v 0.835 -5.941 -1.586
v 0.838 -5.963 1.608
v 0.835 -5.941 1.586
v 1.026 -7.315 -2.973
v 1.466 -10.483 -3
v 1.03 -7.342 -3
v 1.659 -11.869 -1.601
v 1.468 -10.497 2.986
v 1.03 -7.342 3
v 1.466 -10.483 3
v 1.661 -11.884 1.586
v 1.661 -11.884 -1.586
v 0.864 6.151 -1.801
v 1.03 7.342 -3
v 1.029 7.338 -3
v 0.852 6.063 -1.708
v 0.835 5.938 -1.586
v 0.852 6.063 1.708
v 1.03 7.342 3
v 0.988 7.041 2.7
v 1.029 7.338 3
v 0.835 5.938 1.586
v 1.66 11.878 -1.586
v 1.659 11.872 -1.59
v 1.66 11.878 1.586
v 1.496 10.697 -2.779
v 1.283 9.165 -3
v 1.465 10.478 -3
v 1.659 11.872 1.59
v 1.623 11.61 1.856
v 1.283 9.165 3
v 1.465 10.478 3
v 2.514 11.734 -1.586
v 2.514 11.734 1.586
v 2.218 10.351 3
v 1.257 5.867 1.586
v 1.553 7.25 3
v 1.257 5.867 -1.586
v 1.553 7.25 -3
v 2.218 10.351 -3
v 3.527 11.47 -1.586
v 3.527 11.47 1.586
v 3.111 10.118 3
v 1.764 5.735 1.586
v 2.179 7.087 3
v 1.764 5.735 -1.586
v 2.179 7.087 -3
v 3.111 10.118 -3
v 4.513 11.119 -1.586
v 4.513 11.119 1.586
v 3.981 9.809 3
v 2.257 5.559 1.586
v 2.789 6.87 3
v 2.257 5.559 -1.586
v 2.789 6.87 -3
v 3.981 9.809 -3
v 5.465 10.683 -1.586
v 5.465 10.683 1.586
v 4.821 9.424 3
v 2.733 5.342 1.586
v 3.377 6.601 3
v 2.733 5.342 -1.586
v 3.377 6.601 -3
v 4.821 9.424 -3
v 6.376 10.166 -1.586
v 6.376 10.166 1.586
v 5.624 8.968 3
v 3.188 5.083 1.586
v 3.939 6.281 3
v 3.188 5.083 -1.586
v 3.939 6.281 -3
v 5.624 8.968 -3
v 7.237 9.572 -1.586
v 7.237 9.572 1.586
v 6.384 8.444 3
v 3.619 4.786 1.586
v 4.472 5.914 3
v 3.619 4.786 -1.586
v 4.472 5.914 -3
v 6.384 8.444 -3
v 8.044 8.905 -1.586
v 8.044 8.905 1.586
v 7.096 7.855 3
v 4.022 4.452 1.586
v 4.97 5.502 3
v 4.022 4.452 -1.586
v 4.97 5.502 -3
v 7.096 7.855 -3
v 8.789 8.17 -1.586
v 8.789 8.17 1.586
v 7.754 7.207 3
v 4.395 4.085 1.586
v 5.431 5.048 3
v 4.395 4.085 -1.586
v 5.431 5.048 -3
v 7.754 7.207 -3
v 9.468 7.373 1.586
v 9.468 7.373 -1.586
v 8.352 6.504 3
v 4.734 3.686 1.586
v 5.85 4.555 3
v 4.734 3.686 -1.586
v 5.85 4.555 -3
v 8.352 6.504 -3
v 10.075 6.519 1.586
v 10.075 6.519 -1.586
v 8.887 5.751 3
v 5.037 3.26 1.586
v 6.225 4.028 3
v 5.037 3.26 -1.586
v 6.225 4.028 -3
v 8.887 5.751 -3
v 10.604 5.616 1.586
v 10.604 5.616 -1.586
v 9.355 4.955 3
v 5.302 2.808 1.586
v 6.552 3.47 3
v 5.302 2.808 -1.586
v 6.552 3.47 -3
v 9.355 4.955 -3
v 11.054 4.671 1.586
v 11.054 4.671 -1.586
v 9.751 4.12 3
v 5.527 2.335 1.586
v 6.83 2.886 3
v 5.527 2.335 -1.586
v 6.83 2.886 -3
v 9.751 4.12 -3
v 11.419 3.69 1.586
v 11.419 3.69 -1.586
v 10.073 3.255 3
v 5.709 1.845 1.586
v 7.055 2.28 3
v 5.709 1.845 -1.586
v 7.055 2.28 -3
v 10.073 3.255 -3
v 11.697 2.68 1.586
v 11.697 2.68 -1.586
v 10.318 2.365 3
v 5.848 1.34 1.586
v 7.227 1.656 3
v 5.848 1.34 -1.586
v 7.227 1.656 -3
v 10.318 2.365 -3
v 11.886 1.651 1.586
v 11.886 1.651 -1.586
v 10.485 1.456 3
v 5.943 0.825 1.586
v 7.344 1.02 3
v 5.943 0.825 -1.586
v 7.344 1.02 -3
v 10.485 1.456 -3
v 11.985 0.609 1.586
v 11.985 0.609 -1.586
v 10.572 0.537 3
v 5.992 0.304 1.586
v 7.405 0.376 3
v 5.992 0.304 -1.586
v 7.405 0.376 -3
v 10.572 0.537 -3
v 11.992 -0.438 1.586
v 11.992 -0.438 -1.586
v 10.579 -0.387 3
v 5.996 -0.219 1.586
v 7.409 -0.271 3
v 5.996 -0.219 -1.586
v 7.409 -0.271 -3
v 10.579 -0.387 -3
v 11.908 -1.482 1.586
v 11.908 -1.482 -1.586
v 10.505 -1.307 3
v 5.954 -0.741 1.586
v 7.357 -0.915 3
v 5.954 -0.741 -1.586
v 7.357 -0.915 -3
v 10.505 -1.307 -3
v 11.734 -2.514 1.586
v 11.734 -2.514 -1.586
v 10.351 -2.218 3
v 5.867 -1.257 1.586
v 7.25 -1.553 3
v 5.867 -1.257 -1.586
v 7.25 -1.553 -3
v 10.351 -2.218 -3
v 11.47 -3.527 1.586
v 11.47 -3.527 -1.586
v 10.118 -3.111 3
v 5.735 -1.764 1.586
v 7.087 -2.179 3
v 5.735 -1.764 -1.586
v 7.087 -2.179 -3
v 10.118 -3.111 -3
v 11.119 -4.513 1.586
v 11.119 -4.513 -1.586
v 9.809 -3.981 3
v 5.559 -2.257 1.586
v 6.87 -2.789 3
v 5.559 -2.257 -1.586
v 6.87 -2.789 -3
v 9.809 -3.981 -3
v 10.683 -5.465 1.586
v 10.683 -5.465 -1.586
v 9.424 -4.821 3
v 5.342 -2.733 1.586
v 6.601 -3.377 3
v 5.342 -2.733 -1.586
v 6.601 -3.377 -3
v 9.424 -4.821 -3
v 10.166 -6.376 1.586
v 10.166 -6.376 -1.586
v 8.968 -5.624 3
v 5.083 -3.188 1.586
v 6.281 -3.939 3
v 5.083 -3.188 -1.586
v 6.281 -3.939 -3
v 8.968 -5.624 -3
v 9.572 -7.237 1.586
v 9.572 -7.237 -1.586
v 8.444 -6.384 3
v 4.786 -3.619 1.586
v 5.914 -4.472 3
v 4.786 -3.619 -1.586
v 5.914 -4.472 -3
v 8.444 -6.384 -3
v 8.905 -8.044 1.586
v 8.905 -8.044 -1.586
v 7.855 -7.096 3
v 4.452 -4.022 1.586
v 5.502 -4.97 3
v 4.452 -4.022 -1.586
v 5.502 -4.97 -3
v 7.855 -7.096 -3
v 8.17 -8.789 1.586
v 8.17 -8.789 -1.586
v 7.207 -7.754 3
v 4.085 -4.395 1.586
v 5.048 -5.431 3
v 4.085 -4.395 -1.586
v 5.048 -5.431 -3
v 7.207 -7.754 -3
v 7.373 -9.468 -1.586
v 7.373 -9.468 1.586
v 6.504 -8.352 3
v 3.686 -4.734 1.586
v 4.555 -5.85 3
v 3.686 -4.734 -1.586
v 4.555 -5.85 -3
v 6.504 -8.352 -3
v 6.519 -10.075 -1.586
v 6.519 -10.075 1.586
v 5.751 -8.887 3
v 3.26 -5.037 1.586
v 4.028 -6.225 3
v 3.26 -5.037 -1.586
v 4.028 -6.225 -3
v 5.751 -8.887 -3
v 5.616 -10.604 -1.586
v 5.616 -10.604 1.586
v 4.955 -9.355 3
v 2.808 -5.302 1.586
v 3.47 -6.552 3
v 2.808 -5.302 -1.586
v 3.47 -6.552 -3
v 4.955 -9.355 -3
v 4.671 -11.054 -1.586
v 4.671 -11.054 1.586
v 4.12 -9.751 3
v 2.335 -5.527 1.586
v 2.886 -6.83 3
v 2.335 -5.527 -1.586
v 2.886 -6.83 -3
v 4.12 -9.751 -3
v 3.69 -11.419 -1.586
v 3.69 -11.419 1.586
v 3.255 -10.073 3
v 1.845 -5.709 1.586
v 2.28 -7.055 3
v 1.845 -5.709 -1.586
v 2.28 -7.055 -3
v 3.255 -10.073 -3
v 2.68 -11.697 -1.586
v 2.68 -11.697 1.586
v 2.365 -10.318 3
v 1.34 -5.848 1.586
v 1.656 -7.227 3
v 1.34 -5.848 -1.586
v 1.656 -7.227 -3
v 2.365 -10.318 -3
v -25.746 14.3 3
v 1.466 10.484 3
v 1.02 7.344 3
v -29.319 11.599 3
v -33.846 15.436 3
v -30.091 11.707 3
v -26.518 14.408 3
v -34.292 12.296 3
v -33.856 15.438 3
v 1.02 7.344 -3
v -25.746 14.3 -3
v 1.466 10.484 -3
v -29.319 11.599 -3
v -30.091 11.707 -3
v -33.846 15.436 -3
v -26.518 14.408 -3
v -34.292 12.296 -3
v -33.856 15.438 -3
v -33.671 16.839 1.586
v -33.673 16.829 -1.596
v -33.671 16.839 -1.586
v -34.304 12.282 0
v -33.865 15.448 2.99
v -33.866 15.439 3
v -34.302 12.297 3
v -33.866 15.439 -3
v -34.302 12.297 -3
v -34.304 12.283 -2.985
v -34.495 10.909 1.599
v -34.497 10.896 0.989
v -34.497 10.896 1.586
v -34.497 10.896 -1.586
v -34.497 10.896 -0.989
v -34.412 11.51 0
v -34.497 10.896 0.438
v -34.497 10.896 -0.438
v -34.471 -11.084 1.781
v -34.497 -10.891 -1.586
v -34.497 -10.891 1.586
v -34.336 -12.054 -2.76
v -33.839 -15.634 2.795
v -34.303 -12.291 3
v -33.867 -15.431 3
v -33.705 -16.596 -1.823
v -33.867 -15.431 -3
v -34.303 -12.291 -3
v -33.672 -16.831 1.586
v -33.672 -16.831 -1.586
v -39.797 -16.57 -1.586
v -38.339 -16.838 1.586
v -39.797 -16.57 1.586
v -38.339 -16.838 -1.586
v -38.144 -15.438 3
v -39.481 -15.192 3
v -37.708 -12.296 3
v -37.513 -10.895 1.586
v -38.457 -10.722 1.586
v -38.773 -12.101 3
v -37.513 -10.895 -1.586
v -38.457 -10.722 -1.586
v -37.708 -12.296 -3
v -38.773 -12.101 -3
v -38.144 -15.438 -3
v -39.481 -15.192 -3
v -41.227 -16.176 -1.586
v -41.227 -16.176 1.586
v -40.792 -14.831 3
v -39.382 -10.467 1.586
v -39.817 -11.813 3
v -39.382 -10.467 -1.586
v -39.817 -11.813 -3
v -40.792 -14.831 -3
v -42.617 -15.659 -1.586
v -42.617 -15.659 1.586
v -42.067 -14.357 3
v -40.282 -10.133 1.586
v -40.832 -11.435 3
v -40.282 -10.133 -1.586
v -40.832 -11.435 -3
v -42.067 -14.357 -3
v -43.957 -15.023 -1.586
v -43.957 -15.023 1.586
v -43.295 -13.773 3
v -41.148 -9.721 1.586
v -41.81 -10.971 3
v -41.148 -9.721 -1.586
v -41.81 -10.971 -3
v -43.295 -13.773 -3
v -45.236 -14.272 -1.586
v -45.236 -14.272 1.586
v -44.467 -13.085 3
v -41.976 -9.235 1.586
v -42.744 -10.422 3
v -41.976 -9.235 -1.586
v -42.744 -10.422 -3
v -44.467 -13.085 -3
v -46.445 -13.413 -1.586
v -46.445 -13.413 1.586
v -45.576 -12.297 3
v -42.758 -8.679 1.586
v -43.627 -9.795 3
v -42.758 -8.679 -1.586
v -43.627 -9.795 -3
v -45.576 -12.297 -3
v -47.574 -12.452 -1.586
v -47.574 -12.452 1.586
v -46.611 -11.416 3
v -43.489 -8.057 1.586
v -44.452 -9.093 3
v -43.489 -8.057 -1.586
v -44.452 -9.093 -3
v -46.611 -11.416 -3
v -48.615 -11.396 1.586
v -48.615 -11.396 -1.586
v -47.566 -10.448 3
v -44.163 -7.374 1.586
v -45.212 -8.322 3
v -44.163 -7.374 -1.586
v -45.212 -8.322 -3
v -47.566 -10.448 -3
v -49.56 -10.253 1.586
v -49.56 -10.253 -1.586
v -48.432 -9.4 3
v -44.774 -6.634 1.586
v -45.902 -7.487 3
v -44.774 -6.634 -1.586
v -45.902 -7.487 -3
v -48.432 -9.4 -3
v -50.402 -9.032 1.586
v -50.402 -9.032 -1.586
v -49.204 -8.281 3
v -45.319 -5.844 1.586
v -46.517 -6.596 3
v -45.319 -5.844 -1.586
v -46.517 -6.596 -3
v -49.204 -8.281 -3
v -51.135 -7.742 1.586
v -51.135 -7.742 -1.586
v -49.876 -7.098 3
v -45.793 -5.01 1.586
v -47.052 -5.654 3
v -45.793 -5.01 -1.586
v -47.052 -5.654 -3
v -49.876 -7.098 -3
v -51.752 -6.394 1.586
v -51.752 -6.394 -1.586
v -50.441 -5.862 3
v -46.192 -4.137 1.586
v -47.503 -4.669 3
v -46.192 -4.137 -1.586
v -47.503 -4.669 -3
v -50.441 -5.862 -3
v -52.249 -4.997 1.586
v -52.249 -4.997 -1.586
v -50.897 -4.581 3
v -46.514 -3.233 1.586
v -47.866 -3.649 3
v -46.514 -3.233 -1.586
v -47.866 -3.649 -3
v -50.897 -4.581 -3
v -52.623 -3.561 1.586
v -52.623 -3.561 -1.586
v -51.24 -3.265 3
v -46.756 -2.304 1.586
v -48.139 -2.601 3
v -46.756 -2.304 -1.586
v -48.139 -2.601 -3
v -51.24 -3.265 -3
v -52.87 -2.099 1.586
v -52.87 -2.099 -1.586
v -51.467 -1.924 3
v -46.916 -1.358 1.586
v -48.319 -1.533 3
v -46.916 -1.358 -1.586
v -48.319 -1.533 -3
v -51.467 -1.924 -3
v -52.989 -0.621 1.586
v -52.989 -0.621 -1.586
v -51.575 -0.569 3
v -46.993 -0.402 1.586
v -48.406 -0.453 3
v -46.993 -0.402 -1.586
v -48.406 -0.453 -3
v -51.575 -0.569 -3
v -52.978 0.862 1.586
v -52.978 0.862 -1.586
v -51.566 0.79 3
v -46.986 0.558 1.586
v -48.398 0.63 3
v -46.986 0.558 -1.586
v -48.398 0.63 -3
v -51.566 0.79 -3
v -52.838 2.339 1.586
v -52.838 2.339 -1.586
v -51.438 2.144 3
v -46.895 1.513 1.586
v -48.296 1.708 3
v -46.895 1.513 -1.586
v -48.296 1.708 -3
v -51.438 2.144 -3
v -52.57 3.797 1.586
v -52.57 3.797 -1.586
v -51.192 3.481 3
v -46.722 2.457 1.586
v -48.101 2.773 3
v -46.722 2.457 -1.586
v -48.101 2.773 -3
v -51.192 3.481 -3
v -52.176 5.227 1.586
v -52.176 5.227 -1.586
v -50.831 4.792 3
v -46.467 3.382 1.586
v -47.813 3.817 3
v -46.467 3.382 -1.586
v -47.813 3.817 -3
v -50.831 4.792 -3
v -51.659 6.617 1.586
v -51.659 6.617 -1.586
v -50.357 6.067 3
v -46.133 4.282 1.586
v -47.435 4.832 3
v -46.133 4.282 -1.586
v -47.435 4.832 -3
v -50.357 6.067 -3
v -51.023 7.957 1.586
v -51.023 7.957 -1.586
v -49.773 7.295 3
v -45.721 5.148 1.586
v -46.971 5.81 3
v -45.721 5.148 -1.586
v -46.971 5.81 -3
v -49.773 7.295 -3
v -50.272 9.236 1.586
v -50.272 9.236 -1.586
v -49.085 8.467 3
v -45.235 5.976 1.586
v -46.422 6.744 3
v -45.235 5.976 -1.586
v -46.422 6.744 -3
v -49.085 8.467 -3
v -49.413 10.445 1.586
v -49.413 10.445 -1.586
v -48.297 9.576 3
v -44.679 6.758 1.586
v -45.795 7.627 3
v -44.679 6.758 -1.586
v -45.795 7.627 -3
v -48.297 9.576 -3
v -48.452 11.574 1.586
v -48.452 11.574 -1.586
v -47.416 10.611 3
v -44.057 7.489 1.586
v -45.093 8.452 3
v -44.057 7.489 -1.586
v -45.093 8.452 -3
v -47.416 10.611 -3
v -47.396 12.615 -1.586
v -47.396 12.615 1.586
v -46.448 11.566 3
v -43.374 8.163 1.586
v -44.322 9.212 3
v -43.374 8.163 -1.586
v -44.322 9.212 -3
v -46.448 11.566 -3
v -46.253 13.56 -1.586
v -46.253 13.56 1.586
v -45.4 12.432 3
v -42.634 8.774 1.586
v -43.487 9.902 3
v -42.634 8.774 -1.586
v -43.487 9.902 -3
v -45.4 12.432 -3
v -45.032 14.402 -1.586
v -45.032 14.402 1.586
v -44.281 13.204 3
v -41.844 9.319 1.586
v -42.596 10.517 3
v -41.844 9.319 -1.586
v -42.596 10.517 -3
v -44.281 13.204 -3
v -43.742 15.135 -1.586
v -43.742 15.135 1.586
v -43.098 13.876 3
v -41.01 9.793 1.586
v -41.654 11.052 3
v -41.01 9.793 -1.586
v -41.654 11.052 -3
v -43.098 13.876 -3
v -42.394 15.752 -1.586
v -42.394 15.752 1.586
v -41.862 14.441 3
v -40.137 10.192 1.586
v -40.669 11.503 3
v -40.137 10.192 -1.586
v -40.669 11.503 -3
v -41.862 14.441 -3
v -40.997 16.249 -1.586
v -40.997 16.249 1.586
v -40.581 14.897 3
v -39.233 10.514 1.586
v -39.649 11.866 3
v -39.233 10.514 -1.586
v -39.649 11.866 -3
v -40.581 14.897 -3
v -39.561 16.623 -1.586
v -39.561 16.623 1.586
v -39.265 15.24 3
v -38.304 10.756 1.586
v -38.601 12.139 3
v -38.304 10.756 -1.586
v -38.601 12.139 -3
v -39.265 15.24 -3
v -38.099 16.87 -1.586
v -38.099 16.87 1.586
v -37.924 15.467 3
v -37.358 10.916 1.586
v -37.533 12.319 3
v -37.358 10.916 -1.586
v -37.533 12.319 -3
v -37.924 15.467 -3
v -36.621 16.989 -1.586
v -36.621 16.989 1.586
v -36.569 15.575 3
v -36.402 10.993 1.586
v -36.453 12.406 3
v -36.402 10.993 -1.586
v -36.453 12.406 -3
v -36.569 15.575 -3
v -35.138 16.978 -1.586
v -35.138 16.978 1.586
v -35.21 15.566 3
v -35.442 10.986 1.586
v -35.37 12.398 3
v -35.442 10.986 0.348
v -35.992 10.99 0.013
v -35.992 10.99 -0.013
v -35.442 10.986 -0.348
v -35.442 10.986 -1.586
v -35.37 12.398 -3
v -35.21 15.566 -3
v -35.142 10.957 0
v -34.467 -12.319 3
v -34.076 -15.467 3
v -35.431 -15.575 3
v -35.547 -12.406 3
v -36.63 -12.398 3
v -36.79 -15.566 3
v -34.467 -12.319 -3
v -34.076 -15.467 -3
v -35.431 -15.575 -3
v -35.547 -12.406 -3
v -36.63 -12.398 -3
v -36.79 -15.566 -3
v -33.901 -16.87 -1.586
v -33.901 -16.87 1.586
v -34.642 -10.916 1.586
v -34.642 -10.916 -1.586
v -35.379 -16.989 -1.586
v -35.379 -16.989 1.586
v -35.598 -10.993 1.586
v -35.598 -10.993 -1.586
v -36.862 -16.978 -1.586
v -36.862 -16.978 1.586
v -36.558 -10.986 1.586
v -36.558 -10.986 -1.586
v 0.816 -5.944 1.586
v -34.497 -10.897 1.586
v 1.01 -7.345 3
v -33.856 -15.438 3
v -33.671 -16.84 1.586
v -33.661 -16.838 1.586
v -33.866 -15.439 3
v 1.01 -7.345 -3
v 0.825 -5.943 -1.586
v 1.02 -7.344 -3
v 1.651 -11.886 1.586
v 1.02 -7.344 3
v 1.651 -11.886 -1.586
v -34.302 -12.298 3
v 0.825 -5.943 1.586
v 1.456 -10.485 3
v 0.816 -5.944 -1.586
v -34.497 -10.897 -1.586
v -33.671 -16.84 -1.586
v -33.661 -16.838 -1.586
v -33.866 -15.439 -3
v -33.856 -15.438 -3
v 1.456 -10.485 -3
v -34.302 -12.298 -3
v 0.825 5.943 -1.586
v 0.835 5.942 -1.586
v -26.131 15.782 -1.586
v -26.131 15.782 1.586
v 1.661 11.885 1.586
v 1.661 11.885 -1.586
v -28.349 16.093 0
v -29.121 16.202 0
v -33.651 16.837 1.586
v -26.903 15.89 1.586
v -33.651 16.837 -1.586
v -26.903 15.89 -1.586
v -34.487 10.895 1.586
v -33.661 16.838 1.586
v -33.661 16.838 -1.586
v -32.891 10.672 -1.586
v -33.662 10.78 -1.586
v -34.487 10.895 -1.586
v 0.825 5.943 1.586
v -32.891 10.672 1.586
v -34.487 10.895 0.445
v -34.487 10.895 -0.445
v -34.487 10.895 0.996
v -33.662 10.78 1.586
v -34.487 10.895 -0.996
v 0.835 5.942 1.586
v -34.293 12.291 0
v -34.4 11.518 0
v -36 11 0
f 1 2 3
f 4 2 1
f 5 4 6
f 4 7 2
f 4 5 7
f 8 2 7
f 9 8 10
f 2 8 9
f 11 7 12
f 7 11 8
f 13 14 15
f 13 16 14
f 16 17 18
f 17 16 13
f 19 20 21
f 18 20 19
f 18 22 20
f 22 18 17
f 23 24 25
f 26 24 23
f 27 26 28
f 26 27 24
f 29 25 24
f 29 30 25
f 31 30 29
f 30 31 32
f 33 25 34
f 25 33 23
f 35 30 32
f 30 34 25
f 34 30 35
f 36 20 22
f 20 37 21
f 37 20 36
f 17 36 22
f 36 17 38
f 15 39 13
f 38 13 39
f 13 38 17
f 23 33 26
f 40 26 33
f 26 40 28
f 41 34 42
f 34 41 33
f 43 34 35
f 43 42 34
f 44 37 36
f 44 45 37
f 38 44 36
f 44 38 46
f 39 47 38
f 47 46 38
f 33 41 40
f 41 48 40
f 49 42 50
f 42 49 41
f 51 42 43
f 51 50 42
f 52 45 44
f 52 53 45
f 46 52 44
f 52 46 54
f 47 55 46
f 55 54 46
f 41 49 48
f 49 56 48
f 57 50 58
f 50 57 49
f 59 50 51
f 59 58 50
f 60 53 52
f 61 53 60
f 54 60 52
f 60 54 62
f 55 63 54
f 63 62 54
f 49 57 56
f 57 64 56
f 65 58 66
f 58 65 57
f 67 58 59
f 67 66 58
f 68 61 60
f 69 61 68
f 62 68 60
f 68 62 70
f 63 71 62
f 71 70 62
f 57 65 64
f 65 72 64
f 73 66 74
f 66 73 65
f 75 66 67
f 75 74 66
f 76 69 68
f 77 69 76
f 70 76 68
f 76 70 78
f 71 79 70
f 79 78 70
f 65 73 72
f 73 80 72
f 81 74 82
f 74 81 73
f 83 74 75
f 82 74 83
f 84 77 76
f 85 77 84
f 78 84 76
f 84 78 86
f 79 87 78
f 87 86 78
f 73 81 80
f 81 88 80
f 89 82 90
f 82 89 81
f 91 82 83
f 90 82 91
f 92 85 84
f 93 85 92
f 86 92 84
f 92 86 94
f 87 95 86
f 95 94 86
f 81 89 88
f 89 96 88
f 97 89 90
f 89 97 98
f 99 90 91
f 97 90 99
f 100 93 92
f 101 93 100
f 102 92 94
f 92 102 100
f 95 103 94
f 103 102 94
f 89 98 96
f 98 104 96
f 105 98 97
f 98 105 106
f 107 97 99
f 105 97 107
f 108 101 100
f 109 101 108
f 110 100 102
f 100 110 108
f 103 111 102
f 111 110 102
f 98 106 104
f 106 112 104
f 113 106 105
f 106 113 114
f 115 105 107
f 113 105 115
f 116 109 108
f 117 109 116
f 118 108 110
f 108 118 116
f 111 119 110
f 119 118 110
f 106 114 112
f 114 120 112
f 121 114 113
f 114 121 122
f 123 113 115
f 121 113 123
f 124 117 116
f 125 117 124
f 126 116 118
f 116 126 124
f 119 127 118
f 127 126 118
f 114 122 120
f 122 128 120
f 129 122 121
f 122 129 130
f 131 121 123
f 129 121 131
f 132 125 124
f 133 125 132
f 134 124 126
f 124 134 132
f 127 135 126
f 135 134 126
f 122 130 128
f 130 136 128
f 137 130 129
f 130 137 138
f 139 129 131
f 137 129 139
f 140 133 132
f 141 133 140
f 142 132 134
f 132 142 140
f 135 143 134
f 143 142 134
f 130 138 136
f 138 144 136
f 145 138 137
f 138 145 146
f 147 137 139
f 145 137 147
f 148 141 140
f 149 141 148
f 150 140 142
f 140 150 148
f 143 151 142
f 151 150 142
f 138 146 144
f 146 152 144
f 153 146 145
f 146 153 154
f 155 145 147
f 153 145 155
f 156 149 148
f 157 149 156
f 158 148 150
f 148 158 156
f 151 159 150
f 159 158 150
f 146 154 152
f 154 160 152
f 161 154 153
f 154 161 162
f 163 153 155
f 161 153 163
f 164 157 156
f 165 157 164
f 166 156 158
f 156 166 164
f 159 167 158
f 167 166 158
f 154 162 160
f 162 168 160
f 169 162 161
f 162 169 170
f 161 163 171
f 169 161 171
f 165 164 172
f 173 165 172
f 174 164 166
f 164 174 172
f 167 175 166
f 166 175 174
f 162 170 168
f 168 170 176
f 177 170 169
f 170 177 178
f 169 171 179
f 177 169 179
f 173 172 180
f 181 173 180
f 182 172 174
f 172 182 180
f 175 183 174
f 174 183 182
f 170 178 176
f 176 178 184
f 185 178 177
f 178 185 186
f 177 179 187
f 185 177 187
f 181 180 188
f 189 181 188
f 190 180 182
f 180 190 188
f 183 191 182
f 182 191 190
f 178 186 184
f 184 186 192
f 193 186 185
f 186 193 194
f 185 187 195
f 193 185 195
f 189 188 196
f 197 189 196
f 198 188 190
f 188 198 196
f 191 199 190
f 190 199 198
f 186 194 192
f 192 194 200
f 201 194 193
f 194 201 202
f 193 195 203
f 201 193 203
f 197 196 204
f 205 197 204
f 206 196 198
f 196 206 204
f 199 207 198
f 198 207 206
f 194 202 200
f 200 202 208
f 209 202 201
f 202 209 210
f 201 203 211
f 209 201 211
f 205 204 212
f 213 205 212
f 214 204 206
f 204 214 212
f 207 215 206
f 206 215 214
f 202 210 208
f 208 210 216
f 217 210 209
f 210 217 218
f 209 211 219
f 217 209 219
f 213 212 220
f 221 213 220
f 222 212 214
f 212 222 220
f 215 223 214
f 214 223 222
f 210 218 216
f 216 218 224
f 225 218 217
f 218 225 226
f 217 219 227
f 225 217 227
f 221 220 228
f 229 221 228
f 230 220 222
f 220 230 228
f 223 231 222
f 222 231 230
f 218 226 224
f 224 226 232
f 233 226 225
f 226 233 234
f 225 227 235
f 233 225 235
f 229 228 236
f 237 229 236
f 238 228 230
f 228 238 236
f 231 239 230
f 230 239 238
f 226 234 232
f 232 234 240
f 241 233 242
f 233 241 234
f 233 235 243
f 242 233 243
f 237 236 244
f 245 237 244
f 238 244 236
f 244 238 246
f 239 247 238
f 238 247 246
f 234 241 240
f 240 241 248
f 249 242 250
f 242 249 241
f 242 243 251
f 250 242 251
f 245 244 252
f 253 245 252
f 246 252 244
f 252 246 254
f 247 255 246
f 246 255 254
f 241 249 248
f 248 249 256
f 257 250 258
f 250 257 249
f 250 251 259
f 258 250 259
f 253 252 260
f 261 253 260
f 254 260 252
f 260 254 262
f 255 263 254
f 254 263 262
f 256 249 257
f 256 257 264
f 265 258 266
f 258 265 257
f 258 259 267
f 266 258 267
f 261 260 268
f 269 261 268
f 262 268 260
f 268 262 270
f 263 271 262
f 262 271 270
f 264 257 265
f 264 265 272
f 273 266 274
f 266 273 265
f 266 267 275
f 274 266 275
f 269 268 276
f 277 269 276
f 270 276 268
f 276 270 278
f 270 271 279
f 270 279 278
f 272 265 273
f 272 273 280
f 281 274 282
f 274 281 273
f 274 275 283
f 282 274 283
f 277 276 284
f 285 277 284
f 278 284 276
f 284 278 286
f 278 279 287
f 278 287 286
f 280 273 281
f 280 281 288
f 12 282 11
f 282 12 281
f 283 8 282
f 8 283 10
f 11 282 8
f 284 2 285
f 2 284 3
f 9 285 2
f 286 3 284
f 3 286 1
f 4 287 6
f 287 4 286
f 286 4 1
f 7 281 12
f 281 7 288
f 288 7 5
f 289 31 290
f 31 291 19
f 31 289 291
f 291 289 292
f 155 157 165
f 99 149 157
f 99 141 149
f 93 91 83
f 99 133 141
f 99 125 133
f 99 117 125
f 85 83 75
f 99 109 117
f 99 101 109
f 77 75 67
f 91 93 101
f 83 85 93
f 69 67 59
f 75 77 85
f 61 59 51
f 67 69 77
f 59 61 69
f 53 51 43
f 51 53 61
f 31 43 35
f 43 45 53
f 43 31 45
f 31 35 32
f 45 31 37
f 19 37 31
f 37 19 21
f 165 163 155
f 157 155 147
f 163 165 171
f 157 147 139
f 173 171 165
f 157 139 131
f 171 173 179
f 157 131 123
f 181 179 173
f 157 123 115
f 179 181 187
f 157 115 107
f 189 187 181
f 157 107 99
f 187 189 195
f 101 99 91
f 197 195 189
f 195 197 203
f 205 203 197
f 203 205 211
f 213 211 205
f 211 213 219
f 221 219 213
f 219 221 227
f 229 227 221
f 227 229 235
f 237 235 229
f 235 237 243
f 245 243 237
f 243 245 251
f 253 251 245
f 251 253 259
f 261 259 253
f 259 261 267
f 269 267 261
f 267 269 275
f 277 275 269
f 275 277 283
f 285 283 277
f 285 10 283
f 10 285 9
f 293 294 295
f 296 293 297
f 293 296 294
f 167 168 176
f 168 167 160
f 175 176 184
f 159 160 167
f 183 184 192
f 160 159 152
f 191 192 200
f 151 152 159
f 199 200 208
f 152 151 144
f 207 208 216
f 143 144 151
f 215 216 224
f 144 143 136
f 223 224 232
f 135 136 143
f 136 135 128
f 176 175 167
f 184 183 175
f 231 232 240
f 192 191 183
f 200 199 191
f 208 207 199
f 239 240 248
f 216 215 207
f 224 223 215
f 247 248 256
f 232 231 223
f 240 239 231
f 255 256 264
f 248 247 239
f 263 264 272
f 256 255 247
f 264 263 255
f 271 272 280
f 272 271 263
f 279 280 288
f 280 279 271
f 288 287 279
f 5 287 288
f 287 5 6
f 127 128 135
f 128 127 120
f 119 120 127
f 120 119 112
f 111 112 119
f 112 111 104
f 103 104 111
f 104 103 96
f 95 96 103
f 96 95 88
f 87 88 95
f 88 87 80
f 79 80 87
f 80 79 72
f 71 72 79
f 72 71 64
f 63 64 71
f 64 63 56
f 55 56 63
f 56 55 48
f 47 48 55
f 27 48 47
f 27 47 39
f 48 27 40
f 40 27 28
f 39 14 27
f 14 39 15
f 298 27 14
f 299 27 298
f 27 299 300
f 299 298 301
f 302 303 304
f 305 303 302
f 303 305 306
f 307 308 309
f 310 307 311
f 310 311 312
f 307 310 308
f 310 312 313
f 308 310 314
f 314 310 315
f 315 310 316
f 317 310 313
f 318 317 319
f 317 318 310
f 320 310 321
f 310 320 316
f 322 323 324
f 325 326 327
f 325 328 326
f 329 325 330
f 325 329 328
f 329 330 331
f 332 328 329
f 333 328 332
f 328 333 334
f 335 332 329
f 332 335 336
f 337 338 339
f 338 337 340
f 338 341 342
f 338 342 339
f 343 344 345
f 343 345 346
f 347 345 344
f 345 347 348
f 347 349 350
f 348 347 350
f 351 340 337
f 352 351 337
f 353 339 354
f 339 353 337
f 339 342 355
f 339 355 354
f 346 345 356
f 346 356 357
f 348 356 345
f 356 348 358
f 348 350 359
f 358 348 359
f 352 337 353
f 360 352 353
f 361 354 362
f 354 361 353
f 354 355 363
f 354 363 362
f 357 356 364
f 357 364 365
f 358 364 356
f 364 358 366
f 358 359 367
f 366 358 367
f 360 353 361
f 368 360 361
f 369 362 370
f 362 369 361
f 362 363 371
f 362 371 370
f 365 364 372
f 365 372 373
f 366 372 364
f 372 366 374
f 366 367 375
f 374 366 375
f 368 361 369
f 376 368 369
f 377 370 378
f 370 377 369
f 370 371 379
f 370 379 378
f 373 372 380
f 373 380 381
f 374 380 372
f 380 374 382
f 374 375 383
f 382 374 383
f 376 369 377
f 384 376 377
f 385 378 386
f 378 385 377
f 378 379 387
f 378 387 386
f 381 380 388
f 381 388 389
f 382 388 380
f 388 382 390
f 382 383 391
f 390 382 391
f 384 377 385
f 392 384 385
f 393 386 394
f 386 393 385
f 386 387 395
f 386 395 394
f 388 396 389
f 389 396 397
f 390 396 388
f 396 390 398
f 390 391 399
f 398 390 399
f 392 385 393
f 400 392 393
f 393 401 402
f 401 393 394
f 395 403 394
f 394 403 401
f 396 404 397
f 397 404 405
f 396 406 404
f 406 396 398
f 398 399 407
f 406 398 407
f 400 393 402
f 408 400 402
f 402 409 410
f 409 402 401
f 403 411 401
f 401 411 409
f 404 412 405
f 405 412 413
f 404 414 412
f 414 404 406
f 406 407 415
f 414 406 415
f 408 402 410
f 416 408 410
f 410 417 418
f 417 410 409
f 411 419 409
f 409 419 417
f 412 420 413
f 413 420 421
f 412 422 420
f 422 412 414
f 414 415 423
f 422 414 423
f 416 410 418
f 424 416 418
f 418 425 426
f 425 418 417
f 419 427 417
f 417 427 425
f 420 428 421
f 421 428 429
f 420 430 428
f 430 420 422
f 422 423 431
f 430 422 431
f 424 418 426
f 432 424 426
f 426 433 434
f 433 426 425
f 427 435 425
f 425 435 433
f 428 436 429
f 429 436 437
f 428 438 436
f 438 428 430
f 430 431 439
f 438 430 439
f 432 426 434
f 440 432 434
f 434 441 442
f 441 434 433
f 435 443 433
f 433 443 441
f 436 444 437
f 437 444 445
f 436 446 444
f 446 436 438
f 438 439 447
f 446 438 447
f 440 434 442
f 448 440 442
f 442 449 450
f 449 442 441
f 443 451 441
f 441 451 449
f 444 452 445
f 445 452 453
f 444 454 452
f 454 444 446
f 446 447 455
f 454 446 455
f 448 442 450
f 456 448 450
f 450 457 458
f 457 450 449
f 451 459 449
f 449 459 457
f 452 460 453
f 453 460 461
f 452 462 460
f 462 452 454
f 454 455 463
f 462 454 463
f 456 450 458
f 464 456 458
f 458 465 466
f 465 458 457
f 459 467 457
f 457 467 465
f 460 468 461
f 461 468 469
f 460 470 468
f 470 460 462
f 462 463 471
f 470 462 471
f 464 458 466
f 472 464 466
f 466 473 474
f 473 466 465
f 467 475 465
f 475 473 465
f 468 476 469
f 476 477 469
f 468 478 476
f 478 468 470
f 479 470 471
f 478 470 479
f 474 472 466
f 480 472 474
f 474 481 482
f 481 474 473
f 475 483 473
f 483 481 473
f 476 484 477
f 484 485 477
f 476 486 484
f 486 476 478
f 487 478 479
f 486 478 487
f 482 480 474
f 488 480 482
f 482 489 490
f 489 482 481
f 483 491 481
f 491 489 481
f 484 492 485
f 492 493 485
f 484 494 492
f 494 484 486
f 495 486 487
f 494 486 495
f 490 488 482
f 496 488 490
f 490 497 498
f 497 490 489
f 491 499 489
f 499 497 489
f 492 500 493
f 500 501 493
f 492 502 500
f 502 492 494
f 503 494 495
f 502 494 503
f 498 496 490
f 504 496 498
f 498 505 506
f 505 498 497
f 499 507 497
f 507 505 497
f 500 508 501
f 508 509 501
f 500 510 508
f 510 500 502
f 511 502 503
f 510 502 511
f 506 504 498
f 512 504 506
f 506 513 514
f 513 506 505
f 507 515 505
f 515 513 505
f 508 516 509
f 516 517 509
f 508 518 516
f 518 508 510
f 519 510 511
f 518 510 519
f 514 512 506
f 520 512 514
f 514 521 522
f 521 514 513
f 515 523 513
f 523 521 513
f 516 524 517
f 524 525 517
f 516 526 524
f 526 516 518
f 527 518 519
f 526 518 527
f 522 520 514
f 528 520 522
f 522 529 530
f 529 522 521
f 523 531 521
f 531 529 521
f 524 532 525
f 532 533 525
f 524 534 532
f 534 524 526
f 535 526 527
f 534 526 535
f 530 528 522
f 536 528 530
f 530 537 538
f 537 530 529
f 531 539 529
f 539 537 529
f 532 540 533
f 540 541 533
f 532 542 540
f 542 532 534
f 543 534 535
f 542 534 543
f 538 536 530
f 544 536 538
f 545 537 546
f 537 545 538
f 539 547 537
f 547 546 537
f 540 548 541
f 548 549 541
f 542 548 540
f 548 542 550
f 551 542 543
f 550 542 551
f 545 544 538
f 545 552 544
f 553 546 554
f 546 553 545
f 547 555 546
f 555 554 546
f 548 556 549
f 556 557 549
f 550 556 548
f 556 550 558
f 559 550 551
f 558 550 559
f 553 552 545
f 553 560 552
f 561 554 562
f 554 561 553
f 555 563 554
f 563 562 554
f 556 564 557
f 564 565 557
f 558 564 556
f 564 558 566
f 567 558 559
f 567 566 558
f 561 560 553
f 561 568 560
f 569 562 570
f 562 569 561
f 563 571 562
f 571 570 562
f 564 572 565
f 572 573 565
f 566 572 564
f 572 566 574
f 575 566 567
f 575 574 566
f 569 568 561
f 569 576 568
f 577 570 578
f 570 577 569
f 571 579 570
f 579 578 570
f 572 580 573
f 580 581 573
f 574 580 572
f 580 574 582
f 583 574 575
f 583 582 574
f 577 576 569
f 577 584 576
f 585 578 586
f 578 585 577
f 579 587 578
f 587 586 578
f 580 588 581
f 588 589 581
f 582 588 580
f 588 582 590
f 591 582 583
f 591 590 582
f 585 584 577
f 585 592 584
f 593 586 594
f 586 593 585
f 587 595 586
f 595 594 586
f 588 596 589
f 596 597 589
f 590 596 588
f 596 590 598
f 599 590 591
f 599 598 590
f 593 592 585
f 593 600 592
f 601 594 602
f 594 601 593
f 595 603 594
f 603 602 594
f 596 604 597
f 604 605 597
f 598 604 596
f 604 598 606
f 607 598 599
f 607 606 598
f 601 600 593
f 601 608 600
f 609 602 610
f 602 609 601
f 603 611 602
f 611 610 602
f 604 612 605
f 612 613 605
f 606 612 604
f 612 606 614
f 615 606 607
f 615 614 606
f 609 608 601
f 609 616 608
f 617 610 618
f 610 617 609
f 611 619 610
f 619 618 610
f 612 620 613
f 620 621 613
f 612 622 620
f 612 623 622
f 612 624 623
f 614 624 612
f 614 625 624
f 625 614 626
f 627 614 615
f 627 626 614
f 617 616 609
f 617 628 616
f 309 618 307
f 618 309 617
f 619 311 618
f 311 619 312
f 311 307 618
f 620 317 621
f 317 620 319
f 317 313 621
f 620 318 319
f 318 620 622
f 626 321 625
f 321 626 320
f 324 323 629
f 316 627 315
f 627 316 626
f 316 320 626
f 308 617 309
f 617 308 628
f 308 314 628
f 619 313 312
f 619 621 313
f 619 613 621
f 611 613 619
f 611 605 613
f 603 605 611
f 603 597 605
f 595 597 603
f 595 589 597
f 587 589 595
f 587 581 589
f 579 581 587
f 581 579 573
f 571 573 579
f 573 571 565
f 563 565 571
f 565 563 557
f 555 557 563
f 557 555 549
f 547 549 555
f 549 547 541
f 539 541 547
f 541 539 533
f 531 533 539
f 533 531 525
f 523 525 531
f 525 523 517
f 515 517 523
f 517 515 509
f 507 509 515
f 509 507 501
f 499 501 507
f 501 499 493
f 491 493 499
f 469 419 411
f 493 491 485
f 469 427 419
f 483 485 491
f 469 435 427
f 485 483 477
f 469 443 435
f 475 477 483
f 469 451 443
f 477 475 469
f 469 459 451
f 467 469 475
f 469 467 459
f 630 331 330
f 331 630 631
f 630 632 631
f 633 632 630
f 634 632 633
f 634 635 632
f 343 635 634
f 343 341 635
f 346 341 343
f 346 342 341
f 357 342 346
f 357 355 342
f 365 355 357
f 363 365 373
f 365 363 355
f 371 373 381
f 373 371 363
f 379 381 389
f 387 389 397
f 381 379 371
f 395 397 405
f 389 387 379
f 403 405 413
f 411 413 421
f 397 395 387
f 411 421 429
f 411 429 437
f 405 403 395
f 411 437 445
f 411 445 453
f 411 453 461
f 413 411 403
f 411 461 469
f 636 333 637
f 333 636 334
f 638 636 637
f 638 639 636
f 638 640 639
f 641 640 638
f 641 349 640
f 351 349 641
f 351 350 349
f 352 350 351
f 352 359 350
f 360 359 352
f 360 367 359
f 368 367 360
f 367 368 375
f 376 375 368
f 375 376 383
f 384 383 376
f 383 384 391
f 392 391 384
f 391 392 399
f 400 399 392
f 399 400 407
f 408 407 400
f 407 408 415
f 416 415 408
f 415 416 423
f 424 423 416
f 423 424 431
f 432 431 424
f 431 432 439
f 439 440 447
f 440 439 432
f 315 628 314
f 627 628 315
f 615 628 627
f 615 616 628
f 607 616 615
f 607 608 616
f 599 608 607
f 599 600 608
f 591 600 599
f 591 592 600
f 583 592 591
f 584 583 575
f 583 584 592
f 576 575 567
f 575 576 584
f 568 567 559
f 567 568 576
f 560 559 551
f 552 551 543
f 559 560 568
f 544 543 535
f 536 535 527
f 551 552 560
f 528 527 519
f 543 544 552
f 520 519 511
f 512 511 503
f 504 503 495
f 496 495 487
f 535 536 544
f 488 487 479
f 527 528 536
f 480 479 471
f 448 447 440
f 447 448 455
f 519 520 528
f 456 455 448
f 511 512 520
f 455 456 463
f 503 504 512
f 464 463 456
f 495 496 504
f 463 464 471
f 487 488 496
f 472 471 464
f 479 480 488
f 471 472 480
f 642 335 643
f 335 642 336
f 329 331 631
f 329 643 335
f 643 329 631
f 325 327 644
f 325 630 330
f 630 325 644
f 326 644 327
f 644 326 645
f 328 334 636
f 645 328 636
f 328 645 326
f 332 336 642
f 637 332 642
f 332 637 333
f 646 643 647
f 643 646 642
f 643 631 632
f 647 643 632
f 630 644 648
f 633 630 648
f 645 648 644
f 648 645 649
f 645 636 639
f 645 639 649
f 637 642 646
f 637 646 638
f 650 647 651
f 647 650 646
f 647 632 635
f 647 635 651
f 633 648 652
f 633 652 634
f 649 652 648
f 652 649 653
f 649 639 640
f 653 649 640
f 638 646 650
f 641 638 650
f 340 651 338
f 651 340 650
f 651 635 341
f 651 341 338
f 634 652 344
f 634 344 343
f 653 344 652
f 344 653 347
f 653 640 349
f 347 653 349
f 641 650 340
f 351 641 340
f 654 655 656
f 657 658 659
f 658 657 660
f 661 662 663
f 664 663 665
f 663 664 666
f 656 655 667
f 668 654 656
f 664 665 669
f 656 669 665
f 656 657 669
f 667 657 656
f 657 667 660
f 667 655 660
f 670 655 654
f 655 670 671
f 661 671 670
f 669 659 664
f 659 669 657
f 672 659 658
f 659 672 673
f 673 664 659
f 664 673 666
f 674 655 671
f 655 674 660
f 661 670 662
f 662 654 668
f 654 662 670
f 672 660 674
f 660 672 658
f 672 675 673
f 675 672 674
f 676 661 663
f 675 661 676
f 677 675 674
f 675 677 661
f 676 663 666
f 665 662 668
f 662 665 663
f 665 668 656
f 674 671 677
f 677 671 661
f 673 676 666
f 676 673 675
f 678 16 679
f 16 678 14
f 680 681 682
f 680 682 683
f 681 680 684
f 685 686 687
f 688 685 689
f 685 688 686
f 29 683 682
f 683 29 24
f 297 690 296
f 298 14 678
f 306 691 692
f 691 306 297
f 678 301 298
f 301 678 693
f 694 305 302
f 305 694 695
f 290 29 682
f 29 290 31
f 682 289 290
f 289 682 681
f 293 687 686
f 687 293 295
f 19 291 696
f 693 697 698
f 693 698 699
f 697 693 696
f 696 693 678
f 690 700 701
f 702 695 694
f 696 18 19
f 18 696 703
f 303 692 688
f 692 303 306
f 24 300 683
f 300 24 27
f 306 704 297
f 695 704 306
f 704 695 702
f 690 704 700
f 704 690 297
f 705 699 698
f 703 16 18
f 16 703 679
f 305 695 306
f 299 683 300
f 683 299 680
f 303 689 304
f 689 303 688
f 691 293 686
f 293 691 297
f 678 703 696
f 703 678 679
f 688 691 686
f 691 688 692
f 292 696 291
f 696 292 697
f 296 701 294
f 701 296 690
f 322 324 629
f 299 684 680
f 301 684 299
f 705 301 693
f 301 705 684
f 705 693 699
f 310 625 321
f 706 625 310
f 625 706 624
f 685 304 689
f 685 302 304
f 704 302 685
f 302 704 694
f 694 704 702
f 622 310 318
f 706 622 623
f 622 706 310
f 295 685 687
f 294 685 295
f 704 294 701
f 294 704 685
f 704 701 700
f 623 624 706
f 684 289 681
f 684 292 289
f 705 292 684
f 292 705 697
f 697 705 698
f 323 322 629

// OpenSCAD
// Title: Key Carabiner 
// V4: https://www.thingiverse.com/thing:2978765
// Author: https://www.thingiverse.com/Bikecyclist
// Date: 29/09/2019

// Title: Key Carabiner 
// V3: https://www.thingiverse.com/thing:2978765
// Author: https://www.thingiverse.com/Bikecyclist

// V2: https://www.thingiverse.com/thing:57174
// Author: http://www.thingiverse.com/Jinja
// Last Updated Date: 05-12-13

// V1: https://www.thingiverse.com/thing:38291
// Author: http://www.thingiverse.com/Jinja
// Date: 17/12/2012

/////////// START OF PARAMETERS /////////////////

// the first (smaller) radius
radius1 = 6;

// the second (larger) radius
radius2 = 11;

// the distance between the centers of the radii
length = 36;

// the thickness of the body
width = 6;

// the height of the body
height = 6;

// the width of the gap that cuts the body
gap = 0.39;

// the mm width of the bevelled edge .. limited to a maximum of height/sqrt(2)
rounded = 2;

/////////// END OF PARAMETERS /////////////////

/* [Hidden] */

$fs=0.3*1;
$fa=5*1; //smooth
//$fa=20*1; //rough

bevel = min (rounded/ sqrt(2), height/2);
// small finite distance, ensures proper meshing - no need to change this
epsilon = 0.01;

difference ()
{
    loop (radius1, radius2, width, height, length);

	translate([-length, radius2, 0])
        rotate([0, 45, - 45 - atan((radius2 - radius1)/length)])
        {
            cube([height*2, length, gap]);
            cube([gap, length, height*2]);
        }
}


module loop (r1, r2, w, h, l)
{
    ring_section (r1, w, h, 180 - 2 * atan((r2 - r1)/l));

    translate ([-l, 0, 0])
        rotate ([0, 0, 180])
            ring_section (r2, w, h, 180 + 2 * atan((r2 - r1)/l));

    for (i = [-1, 1])
        hull ()
        {
            rotate ([0, 0, -i * atan((r2 - r1)/l)])
                translate ([0, i * (r1 + w/2), 0])
                    rotate ([90, 0, 90 + (i - 1) * 90])
                        linear_extrude (epsilon, convexity = 10)
                            xsection (w, h);
                
            translate ([-l, 0, 0])
                rotate ([0, 0, -i * atan((r2 - r1)/l)])
                    translate ([0, i * (r2 + w/2), 0])
                        rotate ([90, 0, 90 + (i - 1) * 90, 0, 90])
                            linear_extrude (epsilon, convexity = 10)
                                xsection (w, h);
        }
}

module ring_section (r, w, h, a)
{
    difference ()
    {
        rotate ([0, 0, -a/2])
            rotate_extrude (angle = 360, convexity = 10)
                translate ([r + w/2, 0])
                    xsection (w, h);
        
        if (a <= 180)
        {
            for (i = [-1, 1])
                rotate ([0, 0, i * (-90 + a/2)])
                    translate ([-r - w, 0, 0])
                        cube ([2 * (r + w + epsilon), 2 * (r + w + 2 * epsilon), 2 * h], center = true);
        }
        else
        {
            for (i = [-1, 1])
                rotate ([0, 0, i * (-90 + a/2)])
                    translate ([-r - w, i * (r + w + 2 * epsilon)/2, 0])
                        cube ([2 * (r + w + epsilon), (r + w + 2 * epsilon), 2 * h], center = true);
        }
    }
}

module xsection (w, h)
{
    polygon ([
        [-w/2 + bevel, -h/2],
        [-w/2, -h/2 + bevel],
        [-w/2, h/2 - bevel],
        [-w/2 + bevel, h/2],
        [w/2 - bevel, h/2],
        [w/2, h/2 - bevel],
        [w/2, -h/2 + bevel],
        [w/2 - bevel, -h/2],
    ]);
}
